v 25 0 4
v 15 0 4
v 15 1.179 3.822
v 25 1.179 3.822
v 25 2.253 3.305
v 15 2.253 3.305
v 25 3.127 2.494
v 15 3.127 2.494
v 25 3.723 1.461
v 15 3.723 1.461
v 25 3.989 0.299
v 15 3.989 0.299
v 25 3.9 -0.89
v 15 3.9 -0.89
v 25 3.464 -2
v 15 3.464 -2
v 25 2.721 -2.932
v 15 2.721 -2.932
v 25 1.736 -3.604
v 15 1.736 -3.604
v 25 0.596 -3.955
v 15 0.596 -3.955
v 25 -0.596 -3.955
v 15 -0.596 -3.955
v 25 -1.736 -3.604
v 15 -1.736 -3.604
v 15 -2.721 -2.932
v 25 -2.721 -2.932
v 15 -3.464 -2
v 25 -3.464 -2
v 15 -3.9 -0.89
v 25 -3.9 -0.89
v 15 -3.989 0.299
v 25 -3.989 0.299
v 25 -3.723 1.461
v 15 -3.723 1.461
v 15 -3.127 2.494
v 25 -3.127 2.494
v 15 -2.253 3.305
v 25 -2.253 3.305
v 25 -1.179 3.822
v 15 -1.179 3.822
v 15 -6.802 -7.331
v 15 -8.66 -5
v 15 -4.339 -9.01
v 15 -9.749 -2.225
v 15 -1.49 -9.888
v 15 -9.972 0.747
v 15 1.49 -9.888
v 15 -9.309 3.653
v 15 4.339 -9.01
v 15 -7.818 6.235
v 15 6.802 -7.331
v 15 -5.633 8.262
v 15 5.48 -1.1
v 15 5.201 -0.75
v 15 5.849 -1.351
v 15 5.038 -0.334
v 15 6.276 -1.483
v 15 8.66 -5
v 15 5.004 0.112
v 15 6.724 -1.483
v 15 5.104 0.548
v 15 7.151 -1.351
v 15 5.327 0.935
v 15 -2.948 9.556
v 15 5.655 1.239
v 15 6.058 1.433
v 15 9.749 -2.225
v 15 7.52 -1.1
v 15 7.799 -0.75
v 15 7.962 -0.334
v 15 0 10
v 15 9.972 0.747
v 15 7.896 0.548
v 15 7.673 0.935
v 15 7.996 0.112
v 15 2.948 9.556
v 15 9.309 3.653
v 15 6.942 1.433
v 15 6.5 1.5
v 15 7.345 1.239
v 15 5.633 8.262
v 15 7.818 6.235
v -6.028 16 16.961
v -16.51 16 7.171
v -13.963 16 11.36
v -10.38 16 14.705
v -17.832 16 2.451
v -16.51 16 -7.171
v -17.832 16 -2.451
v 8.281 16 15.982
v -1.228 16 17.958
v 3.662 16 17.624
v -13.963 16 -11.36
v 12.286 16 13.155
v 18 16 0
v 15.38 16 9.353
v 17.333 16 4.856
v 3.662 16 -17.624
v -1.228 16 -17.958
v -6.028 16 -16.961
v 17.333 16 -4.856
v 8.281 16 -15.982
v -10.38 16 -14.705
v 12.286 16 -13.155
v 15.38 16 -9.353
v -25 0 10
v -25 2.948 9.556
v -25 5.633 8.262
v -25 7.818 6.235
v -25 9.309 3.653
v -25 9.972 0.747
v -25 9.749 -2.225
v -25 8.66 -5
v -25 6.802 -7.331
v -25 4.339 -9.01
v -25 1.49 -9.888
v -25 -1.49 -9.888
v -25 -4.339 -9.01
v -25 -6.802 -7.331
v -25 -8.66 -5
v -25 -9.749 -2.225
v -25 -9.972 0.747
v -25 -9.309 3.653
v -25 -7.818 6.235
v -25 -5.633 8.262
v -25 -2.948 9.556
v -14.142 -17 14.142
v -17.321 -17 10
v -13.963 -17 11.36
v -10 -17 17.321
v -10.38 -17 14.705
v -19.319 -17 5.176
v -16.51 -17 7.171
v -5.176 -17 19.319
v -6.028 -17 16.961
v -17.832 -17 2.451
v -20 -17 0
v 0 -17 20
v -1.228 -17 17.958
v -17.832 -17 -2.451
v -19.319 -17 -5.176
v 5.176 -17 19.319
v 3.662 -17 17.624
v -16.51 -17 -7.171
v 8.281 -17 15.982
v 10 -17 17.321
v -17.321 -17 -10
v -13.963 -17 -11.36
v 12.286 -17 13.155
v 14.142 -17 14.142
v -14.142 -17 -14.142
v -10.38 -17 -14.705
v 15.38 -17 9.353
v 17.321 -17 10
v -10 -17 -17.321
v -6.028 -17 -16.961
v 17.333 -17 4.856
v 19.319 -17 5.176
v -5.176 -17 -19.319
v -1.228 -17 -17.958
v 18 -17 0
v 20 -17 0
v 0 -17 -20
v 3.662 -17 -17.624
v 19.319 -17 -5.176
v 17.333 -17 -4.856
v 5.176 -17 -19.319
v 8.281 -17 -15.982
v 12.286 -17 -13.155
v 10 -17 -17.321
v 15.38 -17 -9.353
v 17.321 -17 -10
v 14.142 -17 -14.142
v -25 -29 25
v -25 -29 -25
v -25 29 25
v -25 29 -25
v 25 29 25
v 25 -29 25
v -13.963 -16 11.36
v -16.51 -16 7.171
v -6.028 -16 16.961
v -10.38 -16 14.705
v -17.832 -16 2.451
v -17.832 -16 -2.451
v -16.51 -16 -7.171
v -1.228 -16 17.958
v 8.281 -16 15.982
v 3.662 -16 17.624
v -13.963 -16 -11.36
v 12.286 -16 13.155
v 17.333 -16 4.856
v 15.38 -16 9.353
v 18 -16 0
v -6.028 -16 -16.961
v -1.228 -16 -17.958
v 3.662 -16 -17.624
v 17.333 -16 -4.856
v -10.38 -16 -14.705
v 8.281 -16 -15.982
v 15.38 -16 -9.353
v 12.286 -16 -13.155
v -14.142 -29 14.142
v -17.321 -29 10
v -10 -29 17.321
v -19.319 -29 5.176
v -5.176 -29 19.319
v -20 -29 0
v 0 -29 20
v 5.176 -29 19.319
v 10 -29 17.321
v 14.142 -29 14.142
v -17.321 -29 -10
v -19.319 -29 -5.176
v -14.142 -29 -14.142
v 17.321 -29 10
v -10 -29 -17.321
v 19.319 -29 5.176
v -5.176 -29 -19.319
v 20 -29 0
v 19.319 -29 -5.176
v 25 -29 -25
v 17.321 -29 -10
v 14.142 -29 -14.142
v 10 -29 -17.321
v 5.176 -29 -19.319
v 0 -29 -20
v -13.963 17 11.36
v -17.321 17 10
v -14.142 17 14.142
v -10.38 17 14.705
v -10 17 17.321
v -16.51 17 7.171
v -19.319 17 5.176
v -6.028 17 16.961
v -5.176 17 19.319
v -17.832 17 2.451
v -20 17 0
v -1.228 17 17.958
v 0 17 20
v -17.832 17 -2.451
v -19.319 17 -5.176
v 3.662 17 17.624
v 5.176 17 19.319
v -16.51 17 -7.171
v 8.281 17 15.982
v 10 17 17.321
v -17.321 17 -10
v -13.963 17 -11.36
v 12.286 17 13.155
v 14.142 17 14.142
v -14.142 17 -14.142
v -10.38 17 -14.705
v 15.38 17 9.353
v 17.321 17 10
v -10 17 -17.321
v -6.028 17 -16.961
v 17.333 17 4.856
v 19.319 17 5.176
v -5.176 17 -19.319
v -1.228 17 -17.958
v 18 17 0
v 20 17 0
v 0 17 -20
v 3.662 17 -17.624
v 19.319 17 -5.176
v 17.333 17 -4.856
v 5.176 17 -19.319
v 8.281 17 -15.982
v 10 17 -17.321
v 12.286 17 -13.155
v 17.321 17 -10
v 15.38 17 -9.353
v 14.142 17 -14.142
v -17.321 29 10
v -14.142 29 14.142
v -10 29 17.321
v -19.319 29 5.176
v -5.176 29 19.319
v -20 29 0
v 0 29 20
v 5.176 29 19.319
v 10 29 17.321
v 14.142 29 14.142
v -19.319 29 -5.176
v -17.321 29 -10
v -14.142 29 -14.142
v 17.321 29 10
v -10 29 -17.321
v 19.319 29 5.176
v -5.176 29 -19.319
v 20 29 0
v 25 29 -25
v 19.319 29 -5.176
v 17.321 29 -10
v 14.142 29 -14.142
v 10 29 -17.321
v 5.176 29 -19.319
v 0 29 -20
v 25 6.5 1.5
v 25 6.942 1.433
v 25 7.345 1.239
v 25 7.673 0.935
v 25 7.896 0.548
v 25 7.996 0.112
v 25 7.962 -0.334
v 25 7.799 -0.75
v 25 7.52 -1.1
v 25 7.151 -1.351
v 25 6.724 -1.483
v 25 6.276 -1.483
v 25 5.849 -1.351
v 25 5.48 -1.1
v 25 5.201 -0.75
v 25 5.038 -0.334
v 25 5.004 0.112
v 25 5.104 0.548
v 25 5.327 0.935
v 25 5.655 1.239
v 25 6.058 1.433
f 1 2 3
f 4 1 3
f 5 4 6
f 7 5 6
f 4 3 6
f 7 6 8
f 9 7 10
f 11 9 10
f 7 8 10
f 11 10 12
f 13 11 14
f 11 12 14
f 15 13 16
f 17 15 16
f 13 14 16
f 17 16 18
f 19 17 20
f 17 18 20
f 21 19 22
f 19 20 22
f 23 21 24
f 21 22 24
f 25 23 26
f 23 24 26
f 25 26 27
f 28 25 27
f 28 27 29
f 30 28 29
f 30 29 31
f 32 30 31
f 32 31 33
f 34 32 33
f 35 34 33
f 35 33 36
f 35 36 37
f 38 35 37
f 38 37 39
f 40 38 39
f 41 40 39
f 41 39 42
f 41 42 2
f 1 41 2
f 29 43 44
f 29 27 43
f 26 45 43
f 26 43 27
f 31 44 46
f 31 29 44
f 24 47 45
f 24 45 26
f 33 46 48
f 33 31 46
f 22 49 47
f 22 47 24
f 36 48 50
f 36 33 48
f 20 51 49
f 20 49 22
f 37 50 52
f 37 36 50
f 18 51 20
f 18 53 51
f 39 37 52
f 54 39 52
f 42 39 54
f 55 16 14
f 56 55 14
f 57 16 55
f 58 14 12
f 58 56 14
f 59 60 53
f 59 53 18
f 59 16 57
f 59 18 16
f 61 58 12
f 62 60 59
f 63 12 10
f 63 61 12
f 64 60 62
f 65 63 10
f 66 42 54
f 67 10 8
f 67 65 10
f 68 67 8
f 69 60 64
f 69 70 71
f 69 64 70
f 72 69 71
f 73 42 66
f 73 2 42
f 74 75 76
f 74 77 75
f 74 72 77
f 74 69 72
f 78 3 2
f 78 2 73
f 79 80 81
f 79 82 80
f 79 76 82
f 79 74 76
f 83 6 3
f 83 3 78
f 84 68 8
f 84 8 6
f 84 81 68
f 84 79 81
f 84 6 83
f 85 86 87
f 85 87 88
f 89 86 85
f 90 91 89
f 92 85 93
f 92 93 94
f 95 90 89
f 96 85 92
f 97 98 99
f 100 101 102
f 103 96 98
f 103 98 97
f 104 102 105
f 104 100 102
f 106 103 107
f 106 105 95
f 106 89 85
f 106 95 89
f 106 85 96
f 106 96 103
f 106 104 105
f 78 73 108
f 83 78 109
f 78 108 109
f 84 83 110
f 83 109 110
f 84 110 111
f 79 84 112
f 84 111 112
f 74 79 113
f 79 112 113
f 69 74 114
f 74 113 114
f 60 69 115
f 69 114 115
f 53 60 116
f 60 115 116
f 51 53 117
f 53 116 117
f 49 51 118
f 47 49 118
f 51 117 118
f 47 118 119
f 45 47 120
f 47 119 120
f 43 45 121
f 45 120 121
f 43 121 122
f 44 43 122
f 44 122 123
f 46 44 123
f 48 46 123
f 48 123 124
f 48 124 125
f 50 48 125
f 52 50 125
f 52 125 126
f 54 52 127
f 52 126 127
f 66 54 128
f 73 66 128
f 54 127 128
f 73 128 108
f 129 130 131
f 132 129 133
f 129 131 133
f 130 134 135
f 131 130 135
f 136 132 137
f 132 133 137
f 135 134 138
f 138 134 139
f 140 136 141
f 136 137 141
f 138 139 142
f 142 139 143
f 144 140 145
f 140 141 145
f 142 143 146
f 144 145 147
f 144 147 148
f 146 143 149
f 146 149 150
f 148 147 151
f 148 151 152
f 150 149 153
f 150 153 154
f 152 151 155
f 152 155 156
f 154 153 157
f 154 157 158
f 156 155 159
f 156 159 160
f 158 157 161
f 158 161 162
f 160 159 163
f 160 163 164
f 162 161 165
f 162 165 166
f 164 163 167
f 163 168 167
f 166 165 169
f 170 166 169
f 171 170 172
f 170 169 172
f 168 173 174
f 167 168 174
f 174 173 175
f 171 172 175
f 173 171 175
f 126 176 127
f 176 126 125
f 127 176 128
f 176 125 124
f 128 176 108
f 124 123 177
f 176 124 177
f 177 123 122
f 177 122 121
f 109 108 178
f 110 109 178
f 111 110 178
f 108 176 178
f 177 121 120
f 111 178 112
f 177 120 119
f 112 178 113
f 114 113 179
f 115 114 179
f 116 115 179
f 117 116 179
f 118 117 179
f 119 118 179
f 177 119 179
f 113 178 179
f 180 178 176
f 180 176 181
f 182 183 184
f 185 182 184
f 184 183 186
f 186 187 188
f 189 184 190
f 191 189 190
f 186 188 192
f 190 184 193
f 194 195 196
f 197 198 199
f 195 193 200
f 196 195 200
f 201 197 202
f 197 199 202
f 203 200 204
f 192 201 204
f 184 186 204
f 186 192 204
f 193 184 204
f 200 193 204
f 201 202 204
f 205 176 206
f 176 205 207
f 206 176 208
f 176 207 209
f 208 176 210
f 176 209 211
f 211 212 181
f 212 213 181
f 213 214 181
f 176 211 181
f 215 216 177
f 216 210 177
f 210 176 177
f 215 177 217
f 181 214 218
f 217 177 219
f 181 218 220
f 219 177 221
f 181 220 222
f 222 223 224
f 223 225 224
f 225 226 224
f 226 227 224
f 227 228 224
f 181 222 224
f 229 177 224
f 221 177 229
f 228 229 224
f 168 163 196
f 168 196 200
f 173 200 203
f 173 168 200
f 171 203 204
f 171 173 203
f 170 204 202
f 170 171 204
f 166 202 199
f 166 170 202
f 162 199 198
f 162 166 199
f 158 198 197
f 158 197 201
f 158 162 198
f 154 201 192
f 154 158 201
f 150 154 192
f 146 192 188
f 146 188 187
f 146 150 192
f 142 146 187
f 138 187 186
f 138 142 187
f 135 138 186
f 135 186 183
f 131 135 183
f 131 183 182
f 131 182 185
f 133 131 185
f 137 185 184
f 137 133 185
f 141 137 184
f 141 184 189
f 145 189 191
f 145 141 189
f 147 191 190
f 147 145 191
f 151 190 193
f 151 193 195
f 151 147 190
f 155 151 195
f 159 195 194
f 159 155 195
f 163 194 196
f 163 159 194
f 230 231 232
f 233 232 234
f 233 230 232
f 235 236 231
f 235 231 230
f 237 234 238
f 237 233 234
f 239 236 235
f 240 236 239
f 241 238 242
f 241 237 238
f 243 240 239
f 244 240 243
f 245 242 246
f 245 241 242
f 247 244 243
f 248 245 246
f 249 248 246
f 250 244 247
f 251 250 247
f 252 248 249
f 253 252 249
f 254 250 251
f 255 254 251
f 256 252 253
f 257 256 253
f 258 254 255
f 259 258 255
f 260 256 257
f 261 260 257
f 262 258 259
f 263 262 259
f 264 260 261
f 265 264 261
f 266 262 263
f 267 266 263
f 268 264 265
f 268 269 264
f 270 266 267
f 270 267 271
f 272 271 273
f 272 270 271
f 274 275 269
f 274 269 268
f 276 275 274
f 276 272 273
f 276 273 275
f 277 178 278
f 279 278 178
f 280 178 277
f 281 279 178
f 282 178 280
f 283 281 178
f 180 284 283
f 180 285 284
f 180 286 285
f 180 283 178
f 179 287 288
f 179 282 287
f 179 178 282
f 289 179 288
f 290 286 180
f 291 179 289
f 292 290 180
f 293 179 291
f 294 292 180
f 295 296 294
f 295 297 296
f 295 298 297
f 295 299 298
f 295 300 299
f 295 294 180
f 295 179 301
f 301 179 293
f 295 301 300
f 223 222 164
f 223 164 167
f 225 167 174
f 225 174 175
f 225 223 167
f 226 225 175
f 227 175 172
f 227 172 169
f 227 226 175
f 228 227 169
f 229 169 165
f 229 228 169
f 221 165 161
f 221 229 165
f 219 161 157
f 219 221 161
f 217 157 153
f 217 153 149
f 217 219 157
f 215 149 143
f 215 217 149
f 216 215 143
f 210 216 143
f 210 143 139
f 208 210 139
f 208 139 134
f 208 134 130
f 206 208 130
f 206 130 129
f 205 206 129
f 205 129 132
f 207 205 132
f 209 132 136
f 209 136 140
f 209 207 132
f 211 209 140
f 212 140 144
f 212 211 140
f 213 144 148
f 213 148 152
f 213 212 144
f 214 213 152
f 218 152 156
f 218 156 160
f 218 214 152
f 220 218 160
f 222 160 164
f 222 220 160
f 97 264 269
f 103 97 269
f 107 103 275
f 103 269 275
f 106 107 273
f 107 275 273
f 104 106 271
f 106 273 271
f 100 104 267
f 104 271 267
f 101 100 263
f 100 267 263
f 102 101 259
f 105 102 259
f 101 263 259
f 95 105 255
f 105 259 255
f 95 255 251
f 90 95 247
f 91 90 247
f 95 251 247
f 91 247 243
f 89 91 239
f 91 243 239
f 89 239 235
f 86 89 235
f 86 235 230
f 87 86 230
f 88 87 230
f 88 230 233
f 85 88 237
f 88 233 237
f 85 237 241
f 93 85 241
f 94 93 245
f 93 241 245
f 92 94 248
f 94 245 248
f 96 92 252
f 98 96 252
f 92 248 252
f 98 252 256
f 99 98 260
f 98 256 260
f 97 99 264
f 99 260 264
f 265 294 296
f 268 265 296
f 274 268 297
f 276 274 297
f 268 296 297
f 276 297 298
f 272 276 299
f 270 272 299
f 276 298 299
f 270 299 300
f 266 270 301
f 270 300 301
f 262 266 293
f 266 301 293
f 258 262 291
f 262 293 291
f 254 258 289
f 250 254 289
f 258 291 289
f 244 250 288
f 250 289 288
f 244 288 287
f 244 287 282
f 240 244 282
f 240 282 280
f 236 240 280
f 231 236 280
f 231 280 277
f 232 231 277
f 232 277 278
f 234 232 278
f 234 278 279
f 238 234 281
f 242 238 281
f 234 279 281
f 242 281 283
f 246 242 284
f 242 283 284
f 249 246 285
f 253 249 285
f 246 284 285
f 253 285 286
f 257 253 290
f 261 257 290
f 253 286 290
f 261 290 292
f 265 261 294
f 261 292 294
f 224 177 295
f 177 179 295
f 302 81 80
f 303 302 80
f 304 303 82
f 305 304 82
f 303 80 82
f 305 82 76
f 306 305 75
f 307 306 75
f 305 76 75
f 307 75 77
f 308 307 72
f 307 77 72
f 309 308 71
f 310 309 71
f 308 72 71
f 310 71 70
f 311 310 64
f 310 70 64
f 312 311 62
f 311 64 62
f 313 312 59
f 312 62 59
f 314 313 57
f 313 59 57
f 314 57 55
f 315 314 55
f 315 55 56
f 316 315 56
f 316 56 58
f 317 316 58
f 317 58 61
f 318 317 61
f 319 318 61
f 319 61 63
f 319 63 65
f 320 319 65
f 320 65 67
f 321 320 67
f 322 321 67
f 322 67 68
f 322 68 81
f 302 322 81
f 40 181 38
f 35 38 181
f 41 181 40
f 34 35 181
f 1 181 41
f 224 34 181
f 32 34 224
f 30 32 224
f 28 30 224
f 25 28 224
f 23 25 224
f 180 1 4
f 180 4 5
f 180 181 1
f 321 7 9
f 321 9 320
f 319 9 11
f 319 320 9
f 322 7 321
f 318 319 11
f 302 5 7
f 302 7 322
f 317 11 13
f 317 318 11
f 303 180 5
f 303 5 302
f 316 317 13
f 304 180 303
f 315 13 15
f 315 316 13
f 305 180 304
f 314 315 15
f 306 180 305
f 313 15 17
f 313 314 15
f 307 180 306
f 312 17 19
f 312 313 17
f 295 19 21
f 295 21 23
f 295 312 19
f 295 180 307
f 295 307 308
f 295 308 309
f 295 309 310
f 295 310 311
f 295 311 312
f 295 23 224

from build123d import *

# Parameters (mm, degrees)
SKETCH1_W           = 50
SKETCH1_H           = 50
BOSS_EXTRUDE1_DEPTH = 29
SKETCH2_R           = 10
CUT_EXTRUDE1_DEPTH  = 40
SKETCH5_R           = 1.5
SKETCH5_R_2         = 4
CUT_EXTRUDE2_DEPTH  = 11
SKETCH6_R           = 20
CUT_EXTRUDE3_DEPTH  = 12
SKETCH7_R           = 18
CUT_EXTRUDE4_DEPTH  = 1


with BuildPart() as part:
    # Sketch1 → Boss-Extrude1 (new body, symmetric)
    with BuildSketch(Plane(origin=(0, 0, 0), x_dir=(1, 0, 0), z_dir=(0, 1, 0))):
        Rectangle(SKETCH1_W, SKETCH1_H)
    extrude(amount=BOSS_EXTRUDE1_DEPTH, both=True)

    # Sketch2 → Cut-Extrude1 (cut)
    with BuildSketch(Plane.ZY.offset(25)):
        Circle(SKETCH2_R)
    extrude(amount=-CUT_EXTRUDE1_DEPTH, mode=Mode.SUBTRACT)

    # Sketch5 → Cut-Extrude2 (cut, through all)
    with BuildSketch(Plane.ZY.offset(-15)):
        with Locations((0, 6.5)):
            Circle(SKETCH5_R)
        Circle(SKETCH5_R_2)
    extrude(amount=-CUT_EXTRUDE2_DEPTH, mode=Mode.SUBTRACT)

    # Sketch6 → Cut-Extrude3 (cut)
    with BuildSketch(Plane(origin=(0, 29, 0), x_dir=(1, 0, 0), z_dir=(0, 1, 0))):
        Circle(SKETCH6_R)
    cut_extrude3 = extrude(amount=-CUT_EXTRUDE3_DEPTH, mode=Mode.SUBTRACT)

    # Sketch7 → Cut-Extrude4 (cut)
    with BuildSketch(Plane(origin=(0, 17, 0), x_dir=(1, 0, 0), z_dir=(0, 1, 0))):
        Circle(SKETCH7_R)
    cut_extrude4 = extrude(amount=-CUT_EXTRUDE4_DEPTH, mode=Mode.SUBTRACT)

    # Mirror1: Cut-Extrude3, Cut-Extrude4 across plane
    add(cut_extrude3.mirror(Plane.ZX), mode=Mode.SUBTRACT)
    add(cut_extrude4.mirror(Plane.ZX), mode=Mode.SUBTRACT)


solid = part.part
